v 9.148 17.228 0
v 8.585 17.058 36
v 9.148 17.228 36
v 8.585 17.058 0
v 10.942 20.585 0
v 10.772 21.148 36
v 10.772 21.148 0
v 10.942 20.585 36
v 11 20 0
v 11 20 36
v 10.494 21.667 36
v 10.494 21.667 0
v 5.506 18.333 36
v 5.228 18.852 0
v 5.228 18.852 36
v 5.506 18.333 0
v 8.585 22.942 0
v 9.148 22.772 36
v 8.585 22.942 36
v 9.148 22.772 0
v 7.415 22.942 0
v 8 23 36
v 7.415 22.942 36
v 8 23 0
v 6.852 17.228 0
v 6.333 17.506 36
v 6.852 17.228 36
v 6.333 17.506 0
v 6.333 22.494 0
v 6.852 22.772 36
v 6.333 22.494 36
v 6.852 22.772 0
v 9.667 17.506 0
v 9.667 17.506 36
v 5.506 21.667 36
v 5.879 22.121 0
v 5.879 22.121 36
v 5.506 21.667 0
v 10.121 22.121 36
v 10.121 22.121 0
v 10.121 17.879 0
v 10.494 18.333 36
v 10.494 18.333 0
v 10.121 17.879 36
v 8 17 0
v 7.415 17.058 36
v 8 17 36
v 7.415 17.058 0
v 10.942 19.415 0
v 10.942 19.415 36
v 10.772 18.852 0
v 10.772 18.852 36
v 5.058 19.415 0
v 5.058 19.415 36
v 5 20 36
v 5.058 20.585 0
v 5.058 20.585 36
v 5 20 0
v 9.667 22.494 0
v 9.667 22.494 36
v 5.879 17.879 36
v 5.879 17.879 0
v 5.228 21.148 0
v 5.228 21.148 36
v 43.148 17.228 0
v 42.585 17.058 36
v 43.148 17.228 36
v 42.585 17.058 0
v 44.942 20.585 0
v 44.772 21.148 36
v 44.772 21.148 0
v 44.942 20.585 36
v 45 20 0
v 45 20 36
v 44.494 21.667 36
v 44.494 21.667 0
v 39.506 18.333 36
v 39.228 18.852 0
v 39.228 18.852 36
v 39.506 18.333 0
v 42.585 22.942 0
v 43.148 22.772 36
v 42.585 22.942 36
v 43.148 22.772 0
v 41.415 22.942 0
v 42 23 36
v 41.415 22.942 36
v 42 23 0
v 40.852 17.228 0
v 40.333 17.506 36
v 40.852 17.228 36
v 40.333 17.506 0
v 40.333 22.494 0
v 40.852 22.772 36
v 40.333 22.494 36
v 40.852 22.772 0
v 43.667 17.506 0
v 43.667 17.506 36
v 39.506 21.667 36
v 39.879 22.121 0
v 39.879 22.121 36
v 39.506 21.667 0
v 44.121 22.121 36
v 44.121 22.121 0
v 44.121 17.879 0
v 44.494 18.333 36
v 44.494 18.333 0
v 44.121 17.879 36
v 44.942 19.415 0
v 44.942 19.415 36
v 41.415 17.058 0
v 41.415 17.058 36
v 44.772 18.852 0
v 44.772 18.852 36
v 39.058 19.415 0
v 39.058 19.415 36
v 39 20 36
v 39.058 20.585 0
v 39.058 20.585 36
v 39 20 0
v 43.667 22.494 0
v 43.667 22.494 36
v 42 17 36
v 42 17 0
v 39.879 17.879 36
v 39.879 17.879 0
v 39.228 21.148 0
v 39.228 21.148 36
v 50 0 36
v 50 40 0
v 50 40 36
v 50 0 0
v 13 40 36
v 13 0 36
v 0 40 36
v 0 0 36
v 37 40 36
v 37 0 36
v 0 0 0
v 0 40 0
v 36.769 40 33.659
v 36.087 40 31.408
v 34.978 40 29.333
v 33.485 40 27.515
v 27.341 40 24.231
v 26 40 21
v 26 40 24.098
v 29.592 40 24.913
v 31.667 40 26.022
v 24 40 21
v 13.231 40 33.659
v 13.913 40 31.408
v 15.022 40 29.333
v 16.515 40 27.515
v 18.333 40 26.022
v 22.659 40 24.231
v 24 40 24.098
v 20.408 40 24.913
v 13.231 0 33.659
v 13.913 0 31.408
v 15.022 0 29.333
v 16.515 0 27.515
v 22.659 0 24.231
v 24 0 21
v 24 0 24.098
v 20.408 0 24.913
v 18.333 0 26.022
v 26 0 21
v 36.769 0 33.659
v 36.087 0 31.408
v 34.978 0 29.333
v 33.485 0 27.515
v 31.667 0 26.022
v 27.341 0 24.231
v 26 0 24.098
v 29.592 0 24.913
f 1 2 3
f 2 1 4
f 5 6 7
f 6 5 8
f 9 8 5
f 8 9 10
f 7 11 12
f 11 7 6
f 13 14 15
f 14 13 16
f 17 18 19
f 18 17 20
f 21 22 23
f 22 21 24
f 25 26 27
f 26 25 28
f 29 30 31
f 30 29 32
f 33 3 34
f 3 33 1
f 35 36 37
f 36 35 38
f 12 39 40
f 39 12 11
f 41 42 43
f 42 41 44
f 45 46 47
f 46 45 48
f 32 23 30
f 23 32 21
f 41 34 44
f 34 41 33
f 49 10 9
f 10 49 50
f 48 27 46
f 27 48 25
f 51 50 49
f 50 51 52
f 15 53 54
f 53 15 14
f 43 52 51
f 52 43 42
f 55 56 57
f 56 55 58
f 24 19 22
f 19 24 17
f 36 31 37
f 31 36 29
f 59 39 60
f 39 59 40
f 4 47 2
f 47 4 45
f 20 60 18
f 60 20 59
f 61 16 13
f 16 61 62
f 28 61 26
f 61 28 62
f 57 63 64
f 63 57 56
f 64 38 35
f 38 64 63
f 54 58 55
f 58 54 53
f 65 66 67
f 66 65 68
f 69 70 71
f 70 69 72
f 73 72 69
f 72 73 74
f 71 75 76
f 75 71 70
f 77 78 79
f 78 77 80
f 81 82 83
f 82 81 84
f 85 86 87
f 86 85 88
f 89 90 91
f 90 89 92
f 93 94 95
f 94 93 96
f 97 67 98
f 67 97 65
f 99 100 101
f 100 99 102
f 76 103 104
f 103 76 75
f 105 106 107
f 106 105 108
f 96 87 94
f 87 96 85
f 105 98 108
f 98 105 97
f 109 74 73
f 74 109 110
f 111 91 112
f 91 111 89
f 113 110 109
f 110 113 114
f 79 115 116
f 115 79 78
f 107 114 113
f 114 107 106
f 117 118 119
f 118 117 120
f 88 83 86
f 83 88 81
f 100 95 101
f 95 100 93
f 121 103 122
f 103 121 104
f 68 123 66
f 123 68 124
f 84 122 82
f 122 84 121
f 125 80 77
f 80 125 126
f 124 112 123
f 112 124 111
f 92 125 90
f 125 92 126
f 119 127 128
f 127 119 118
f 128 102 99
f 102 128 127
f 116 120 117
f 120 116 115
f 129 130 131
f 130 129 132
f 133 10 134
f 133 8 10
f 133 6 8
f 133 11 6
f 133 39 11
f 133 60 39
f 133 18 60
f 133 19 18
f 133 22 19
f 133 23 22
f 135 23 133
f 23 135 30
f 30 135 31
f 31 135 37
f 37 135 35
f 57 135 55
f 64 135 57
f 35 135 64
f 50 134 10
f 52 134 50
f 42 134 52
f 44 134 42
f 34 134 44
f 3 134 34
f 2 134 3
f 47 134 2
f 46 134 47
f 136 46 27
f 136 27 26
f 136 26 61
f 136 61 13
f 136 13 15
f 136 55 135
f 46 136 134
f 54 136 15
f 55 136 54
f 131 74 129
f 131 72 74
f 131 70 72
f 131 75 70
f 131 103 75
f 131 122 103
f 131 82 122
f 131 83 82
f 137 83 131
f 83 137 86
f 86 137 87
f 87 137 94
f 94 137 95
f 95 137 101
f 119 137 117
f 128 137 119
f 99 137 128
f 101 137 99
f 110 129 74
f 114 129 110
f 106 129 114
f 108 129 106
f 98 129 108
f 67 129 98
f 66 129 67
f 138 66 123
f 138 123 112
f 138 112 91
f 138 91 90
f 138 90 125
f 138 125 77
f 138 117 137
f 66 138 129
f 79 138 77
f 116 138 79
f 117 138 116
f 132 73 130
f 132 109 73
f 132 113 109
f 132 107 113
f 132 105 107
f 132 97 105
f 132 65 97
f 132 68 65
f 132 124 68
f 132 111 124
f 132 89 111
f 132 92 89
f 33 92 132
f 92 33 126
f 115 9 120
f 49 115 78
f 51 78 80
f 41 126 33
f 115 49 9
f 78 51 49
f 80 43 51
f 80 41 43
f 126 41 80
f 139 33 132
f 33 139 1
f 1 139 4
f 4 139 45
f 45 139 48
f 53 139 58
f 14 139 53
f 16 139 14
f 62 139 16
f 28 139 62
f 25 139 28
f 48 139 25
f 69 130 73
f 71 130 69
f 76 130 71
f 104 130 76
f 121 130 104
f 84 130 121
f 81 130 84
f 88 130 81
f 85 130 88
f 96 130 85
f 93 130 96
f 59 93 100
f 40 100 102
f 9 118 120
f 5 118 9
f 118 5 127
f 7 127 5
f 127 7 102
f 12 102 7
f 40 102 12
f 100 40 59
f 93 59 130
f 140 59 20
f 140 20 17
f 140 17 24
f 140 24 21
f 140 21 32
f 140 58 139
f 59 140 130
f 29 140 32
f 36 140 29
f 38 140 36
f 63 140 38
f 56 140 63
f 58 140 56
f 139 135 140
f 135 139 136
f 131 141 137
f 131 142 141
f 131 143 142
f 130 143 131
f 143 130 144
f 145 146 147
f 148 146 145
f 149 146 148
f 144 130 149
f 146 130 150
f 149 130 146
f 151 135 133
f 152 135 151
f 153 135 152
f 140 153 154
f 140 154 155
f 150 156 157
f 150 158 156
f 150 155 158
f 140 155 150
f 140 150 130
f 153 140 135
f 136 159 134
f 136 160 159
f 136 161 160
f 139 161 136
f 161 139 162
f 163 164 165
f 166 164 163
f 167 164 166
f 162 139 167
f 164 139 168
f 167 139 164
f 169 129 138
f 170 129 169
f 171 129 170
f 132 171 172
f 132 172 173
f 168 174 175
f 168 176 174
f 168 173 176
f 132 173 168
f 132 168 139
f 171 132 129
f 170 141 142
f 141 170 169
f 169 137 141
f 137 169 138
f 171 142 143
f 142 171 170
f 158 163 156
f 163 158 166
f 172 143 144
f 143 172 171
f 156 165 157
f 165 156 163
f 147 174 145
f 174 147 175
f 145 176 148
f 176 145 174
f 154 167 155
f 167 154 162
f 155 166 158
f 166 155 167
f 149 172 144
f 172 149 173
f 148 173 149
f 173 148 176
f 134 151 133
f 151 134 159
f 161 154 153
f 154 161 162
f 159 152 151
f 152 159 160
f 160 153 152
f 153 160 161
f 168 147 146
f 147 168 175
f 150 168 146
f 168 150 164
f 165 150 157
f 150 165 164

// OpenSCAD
$fn = 32;

// ----------------------------------------------------------------------
// Saddle clamp: split shaft clamp
// ----------------------------------------------------------------------

// --- parameters (mm) ---
blk_l = 50;               // block length, X
blk_w = 40;               // block width, Y
blk_h = 36;               // block height
clamp_r = 12;             // shaft groove radius
hole_r = 3;               // bolt hole radius
hole_m = 8;               // bolt hole margin from the ends
saw_w = 2;                // saw kerf width
fit_tol = 0.1;            // tolerance for press fits, mm
free_tol = 0.3;           // tolerance for clearance fits, mm

saw_depth = clamp_r + 3;  // saw kerf depth

difference() {
  cube([blk_l, blk_w, blk_h]);
  translate([blk_l / 2, -1, blk_h])
    rotate([-90, 0, 0])
      cylinder(h = blk_w + 2, r = clamp_r);
  for (sx = [0, 1])
    translate([sx ? blk_l - hole_m : hole_m, blk_w / 2, -1])
      cylinder(r = hole_r, h = blk_h + 2);
  translate([blk_l / 2 - saw_w / 2, -1, blk_h - saw_depth])
    cube([saw_w, blk_w + 2, saw_depth + 1]);
}
